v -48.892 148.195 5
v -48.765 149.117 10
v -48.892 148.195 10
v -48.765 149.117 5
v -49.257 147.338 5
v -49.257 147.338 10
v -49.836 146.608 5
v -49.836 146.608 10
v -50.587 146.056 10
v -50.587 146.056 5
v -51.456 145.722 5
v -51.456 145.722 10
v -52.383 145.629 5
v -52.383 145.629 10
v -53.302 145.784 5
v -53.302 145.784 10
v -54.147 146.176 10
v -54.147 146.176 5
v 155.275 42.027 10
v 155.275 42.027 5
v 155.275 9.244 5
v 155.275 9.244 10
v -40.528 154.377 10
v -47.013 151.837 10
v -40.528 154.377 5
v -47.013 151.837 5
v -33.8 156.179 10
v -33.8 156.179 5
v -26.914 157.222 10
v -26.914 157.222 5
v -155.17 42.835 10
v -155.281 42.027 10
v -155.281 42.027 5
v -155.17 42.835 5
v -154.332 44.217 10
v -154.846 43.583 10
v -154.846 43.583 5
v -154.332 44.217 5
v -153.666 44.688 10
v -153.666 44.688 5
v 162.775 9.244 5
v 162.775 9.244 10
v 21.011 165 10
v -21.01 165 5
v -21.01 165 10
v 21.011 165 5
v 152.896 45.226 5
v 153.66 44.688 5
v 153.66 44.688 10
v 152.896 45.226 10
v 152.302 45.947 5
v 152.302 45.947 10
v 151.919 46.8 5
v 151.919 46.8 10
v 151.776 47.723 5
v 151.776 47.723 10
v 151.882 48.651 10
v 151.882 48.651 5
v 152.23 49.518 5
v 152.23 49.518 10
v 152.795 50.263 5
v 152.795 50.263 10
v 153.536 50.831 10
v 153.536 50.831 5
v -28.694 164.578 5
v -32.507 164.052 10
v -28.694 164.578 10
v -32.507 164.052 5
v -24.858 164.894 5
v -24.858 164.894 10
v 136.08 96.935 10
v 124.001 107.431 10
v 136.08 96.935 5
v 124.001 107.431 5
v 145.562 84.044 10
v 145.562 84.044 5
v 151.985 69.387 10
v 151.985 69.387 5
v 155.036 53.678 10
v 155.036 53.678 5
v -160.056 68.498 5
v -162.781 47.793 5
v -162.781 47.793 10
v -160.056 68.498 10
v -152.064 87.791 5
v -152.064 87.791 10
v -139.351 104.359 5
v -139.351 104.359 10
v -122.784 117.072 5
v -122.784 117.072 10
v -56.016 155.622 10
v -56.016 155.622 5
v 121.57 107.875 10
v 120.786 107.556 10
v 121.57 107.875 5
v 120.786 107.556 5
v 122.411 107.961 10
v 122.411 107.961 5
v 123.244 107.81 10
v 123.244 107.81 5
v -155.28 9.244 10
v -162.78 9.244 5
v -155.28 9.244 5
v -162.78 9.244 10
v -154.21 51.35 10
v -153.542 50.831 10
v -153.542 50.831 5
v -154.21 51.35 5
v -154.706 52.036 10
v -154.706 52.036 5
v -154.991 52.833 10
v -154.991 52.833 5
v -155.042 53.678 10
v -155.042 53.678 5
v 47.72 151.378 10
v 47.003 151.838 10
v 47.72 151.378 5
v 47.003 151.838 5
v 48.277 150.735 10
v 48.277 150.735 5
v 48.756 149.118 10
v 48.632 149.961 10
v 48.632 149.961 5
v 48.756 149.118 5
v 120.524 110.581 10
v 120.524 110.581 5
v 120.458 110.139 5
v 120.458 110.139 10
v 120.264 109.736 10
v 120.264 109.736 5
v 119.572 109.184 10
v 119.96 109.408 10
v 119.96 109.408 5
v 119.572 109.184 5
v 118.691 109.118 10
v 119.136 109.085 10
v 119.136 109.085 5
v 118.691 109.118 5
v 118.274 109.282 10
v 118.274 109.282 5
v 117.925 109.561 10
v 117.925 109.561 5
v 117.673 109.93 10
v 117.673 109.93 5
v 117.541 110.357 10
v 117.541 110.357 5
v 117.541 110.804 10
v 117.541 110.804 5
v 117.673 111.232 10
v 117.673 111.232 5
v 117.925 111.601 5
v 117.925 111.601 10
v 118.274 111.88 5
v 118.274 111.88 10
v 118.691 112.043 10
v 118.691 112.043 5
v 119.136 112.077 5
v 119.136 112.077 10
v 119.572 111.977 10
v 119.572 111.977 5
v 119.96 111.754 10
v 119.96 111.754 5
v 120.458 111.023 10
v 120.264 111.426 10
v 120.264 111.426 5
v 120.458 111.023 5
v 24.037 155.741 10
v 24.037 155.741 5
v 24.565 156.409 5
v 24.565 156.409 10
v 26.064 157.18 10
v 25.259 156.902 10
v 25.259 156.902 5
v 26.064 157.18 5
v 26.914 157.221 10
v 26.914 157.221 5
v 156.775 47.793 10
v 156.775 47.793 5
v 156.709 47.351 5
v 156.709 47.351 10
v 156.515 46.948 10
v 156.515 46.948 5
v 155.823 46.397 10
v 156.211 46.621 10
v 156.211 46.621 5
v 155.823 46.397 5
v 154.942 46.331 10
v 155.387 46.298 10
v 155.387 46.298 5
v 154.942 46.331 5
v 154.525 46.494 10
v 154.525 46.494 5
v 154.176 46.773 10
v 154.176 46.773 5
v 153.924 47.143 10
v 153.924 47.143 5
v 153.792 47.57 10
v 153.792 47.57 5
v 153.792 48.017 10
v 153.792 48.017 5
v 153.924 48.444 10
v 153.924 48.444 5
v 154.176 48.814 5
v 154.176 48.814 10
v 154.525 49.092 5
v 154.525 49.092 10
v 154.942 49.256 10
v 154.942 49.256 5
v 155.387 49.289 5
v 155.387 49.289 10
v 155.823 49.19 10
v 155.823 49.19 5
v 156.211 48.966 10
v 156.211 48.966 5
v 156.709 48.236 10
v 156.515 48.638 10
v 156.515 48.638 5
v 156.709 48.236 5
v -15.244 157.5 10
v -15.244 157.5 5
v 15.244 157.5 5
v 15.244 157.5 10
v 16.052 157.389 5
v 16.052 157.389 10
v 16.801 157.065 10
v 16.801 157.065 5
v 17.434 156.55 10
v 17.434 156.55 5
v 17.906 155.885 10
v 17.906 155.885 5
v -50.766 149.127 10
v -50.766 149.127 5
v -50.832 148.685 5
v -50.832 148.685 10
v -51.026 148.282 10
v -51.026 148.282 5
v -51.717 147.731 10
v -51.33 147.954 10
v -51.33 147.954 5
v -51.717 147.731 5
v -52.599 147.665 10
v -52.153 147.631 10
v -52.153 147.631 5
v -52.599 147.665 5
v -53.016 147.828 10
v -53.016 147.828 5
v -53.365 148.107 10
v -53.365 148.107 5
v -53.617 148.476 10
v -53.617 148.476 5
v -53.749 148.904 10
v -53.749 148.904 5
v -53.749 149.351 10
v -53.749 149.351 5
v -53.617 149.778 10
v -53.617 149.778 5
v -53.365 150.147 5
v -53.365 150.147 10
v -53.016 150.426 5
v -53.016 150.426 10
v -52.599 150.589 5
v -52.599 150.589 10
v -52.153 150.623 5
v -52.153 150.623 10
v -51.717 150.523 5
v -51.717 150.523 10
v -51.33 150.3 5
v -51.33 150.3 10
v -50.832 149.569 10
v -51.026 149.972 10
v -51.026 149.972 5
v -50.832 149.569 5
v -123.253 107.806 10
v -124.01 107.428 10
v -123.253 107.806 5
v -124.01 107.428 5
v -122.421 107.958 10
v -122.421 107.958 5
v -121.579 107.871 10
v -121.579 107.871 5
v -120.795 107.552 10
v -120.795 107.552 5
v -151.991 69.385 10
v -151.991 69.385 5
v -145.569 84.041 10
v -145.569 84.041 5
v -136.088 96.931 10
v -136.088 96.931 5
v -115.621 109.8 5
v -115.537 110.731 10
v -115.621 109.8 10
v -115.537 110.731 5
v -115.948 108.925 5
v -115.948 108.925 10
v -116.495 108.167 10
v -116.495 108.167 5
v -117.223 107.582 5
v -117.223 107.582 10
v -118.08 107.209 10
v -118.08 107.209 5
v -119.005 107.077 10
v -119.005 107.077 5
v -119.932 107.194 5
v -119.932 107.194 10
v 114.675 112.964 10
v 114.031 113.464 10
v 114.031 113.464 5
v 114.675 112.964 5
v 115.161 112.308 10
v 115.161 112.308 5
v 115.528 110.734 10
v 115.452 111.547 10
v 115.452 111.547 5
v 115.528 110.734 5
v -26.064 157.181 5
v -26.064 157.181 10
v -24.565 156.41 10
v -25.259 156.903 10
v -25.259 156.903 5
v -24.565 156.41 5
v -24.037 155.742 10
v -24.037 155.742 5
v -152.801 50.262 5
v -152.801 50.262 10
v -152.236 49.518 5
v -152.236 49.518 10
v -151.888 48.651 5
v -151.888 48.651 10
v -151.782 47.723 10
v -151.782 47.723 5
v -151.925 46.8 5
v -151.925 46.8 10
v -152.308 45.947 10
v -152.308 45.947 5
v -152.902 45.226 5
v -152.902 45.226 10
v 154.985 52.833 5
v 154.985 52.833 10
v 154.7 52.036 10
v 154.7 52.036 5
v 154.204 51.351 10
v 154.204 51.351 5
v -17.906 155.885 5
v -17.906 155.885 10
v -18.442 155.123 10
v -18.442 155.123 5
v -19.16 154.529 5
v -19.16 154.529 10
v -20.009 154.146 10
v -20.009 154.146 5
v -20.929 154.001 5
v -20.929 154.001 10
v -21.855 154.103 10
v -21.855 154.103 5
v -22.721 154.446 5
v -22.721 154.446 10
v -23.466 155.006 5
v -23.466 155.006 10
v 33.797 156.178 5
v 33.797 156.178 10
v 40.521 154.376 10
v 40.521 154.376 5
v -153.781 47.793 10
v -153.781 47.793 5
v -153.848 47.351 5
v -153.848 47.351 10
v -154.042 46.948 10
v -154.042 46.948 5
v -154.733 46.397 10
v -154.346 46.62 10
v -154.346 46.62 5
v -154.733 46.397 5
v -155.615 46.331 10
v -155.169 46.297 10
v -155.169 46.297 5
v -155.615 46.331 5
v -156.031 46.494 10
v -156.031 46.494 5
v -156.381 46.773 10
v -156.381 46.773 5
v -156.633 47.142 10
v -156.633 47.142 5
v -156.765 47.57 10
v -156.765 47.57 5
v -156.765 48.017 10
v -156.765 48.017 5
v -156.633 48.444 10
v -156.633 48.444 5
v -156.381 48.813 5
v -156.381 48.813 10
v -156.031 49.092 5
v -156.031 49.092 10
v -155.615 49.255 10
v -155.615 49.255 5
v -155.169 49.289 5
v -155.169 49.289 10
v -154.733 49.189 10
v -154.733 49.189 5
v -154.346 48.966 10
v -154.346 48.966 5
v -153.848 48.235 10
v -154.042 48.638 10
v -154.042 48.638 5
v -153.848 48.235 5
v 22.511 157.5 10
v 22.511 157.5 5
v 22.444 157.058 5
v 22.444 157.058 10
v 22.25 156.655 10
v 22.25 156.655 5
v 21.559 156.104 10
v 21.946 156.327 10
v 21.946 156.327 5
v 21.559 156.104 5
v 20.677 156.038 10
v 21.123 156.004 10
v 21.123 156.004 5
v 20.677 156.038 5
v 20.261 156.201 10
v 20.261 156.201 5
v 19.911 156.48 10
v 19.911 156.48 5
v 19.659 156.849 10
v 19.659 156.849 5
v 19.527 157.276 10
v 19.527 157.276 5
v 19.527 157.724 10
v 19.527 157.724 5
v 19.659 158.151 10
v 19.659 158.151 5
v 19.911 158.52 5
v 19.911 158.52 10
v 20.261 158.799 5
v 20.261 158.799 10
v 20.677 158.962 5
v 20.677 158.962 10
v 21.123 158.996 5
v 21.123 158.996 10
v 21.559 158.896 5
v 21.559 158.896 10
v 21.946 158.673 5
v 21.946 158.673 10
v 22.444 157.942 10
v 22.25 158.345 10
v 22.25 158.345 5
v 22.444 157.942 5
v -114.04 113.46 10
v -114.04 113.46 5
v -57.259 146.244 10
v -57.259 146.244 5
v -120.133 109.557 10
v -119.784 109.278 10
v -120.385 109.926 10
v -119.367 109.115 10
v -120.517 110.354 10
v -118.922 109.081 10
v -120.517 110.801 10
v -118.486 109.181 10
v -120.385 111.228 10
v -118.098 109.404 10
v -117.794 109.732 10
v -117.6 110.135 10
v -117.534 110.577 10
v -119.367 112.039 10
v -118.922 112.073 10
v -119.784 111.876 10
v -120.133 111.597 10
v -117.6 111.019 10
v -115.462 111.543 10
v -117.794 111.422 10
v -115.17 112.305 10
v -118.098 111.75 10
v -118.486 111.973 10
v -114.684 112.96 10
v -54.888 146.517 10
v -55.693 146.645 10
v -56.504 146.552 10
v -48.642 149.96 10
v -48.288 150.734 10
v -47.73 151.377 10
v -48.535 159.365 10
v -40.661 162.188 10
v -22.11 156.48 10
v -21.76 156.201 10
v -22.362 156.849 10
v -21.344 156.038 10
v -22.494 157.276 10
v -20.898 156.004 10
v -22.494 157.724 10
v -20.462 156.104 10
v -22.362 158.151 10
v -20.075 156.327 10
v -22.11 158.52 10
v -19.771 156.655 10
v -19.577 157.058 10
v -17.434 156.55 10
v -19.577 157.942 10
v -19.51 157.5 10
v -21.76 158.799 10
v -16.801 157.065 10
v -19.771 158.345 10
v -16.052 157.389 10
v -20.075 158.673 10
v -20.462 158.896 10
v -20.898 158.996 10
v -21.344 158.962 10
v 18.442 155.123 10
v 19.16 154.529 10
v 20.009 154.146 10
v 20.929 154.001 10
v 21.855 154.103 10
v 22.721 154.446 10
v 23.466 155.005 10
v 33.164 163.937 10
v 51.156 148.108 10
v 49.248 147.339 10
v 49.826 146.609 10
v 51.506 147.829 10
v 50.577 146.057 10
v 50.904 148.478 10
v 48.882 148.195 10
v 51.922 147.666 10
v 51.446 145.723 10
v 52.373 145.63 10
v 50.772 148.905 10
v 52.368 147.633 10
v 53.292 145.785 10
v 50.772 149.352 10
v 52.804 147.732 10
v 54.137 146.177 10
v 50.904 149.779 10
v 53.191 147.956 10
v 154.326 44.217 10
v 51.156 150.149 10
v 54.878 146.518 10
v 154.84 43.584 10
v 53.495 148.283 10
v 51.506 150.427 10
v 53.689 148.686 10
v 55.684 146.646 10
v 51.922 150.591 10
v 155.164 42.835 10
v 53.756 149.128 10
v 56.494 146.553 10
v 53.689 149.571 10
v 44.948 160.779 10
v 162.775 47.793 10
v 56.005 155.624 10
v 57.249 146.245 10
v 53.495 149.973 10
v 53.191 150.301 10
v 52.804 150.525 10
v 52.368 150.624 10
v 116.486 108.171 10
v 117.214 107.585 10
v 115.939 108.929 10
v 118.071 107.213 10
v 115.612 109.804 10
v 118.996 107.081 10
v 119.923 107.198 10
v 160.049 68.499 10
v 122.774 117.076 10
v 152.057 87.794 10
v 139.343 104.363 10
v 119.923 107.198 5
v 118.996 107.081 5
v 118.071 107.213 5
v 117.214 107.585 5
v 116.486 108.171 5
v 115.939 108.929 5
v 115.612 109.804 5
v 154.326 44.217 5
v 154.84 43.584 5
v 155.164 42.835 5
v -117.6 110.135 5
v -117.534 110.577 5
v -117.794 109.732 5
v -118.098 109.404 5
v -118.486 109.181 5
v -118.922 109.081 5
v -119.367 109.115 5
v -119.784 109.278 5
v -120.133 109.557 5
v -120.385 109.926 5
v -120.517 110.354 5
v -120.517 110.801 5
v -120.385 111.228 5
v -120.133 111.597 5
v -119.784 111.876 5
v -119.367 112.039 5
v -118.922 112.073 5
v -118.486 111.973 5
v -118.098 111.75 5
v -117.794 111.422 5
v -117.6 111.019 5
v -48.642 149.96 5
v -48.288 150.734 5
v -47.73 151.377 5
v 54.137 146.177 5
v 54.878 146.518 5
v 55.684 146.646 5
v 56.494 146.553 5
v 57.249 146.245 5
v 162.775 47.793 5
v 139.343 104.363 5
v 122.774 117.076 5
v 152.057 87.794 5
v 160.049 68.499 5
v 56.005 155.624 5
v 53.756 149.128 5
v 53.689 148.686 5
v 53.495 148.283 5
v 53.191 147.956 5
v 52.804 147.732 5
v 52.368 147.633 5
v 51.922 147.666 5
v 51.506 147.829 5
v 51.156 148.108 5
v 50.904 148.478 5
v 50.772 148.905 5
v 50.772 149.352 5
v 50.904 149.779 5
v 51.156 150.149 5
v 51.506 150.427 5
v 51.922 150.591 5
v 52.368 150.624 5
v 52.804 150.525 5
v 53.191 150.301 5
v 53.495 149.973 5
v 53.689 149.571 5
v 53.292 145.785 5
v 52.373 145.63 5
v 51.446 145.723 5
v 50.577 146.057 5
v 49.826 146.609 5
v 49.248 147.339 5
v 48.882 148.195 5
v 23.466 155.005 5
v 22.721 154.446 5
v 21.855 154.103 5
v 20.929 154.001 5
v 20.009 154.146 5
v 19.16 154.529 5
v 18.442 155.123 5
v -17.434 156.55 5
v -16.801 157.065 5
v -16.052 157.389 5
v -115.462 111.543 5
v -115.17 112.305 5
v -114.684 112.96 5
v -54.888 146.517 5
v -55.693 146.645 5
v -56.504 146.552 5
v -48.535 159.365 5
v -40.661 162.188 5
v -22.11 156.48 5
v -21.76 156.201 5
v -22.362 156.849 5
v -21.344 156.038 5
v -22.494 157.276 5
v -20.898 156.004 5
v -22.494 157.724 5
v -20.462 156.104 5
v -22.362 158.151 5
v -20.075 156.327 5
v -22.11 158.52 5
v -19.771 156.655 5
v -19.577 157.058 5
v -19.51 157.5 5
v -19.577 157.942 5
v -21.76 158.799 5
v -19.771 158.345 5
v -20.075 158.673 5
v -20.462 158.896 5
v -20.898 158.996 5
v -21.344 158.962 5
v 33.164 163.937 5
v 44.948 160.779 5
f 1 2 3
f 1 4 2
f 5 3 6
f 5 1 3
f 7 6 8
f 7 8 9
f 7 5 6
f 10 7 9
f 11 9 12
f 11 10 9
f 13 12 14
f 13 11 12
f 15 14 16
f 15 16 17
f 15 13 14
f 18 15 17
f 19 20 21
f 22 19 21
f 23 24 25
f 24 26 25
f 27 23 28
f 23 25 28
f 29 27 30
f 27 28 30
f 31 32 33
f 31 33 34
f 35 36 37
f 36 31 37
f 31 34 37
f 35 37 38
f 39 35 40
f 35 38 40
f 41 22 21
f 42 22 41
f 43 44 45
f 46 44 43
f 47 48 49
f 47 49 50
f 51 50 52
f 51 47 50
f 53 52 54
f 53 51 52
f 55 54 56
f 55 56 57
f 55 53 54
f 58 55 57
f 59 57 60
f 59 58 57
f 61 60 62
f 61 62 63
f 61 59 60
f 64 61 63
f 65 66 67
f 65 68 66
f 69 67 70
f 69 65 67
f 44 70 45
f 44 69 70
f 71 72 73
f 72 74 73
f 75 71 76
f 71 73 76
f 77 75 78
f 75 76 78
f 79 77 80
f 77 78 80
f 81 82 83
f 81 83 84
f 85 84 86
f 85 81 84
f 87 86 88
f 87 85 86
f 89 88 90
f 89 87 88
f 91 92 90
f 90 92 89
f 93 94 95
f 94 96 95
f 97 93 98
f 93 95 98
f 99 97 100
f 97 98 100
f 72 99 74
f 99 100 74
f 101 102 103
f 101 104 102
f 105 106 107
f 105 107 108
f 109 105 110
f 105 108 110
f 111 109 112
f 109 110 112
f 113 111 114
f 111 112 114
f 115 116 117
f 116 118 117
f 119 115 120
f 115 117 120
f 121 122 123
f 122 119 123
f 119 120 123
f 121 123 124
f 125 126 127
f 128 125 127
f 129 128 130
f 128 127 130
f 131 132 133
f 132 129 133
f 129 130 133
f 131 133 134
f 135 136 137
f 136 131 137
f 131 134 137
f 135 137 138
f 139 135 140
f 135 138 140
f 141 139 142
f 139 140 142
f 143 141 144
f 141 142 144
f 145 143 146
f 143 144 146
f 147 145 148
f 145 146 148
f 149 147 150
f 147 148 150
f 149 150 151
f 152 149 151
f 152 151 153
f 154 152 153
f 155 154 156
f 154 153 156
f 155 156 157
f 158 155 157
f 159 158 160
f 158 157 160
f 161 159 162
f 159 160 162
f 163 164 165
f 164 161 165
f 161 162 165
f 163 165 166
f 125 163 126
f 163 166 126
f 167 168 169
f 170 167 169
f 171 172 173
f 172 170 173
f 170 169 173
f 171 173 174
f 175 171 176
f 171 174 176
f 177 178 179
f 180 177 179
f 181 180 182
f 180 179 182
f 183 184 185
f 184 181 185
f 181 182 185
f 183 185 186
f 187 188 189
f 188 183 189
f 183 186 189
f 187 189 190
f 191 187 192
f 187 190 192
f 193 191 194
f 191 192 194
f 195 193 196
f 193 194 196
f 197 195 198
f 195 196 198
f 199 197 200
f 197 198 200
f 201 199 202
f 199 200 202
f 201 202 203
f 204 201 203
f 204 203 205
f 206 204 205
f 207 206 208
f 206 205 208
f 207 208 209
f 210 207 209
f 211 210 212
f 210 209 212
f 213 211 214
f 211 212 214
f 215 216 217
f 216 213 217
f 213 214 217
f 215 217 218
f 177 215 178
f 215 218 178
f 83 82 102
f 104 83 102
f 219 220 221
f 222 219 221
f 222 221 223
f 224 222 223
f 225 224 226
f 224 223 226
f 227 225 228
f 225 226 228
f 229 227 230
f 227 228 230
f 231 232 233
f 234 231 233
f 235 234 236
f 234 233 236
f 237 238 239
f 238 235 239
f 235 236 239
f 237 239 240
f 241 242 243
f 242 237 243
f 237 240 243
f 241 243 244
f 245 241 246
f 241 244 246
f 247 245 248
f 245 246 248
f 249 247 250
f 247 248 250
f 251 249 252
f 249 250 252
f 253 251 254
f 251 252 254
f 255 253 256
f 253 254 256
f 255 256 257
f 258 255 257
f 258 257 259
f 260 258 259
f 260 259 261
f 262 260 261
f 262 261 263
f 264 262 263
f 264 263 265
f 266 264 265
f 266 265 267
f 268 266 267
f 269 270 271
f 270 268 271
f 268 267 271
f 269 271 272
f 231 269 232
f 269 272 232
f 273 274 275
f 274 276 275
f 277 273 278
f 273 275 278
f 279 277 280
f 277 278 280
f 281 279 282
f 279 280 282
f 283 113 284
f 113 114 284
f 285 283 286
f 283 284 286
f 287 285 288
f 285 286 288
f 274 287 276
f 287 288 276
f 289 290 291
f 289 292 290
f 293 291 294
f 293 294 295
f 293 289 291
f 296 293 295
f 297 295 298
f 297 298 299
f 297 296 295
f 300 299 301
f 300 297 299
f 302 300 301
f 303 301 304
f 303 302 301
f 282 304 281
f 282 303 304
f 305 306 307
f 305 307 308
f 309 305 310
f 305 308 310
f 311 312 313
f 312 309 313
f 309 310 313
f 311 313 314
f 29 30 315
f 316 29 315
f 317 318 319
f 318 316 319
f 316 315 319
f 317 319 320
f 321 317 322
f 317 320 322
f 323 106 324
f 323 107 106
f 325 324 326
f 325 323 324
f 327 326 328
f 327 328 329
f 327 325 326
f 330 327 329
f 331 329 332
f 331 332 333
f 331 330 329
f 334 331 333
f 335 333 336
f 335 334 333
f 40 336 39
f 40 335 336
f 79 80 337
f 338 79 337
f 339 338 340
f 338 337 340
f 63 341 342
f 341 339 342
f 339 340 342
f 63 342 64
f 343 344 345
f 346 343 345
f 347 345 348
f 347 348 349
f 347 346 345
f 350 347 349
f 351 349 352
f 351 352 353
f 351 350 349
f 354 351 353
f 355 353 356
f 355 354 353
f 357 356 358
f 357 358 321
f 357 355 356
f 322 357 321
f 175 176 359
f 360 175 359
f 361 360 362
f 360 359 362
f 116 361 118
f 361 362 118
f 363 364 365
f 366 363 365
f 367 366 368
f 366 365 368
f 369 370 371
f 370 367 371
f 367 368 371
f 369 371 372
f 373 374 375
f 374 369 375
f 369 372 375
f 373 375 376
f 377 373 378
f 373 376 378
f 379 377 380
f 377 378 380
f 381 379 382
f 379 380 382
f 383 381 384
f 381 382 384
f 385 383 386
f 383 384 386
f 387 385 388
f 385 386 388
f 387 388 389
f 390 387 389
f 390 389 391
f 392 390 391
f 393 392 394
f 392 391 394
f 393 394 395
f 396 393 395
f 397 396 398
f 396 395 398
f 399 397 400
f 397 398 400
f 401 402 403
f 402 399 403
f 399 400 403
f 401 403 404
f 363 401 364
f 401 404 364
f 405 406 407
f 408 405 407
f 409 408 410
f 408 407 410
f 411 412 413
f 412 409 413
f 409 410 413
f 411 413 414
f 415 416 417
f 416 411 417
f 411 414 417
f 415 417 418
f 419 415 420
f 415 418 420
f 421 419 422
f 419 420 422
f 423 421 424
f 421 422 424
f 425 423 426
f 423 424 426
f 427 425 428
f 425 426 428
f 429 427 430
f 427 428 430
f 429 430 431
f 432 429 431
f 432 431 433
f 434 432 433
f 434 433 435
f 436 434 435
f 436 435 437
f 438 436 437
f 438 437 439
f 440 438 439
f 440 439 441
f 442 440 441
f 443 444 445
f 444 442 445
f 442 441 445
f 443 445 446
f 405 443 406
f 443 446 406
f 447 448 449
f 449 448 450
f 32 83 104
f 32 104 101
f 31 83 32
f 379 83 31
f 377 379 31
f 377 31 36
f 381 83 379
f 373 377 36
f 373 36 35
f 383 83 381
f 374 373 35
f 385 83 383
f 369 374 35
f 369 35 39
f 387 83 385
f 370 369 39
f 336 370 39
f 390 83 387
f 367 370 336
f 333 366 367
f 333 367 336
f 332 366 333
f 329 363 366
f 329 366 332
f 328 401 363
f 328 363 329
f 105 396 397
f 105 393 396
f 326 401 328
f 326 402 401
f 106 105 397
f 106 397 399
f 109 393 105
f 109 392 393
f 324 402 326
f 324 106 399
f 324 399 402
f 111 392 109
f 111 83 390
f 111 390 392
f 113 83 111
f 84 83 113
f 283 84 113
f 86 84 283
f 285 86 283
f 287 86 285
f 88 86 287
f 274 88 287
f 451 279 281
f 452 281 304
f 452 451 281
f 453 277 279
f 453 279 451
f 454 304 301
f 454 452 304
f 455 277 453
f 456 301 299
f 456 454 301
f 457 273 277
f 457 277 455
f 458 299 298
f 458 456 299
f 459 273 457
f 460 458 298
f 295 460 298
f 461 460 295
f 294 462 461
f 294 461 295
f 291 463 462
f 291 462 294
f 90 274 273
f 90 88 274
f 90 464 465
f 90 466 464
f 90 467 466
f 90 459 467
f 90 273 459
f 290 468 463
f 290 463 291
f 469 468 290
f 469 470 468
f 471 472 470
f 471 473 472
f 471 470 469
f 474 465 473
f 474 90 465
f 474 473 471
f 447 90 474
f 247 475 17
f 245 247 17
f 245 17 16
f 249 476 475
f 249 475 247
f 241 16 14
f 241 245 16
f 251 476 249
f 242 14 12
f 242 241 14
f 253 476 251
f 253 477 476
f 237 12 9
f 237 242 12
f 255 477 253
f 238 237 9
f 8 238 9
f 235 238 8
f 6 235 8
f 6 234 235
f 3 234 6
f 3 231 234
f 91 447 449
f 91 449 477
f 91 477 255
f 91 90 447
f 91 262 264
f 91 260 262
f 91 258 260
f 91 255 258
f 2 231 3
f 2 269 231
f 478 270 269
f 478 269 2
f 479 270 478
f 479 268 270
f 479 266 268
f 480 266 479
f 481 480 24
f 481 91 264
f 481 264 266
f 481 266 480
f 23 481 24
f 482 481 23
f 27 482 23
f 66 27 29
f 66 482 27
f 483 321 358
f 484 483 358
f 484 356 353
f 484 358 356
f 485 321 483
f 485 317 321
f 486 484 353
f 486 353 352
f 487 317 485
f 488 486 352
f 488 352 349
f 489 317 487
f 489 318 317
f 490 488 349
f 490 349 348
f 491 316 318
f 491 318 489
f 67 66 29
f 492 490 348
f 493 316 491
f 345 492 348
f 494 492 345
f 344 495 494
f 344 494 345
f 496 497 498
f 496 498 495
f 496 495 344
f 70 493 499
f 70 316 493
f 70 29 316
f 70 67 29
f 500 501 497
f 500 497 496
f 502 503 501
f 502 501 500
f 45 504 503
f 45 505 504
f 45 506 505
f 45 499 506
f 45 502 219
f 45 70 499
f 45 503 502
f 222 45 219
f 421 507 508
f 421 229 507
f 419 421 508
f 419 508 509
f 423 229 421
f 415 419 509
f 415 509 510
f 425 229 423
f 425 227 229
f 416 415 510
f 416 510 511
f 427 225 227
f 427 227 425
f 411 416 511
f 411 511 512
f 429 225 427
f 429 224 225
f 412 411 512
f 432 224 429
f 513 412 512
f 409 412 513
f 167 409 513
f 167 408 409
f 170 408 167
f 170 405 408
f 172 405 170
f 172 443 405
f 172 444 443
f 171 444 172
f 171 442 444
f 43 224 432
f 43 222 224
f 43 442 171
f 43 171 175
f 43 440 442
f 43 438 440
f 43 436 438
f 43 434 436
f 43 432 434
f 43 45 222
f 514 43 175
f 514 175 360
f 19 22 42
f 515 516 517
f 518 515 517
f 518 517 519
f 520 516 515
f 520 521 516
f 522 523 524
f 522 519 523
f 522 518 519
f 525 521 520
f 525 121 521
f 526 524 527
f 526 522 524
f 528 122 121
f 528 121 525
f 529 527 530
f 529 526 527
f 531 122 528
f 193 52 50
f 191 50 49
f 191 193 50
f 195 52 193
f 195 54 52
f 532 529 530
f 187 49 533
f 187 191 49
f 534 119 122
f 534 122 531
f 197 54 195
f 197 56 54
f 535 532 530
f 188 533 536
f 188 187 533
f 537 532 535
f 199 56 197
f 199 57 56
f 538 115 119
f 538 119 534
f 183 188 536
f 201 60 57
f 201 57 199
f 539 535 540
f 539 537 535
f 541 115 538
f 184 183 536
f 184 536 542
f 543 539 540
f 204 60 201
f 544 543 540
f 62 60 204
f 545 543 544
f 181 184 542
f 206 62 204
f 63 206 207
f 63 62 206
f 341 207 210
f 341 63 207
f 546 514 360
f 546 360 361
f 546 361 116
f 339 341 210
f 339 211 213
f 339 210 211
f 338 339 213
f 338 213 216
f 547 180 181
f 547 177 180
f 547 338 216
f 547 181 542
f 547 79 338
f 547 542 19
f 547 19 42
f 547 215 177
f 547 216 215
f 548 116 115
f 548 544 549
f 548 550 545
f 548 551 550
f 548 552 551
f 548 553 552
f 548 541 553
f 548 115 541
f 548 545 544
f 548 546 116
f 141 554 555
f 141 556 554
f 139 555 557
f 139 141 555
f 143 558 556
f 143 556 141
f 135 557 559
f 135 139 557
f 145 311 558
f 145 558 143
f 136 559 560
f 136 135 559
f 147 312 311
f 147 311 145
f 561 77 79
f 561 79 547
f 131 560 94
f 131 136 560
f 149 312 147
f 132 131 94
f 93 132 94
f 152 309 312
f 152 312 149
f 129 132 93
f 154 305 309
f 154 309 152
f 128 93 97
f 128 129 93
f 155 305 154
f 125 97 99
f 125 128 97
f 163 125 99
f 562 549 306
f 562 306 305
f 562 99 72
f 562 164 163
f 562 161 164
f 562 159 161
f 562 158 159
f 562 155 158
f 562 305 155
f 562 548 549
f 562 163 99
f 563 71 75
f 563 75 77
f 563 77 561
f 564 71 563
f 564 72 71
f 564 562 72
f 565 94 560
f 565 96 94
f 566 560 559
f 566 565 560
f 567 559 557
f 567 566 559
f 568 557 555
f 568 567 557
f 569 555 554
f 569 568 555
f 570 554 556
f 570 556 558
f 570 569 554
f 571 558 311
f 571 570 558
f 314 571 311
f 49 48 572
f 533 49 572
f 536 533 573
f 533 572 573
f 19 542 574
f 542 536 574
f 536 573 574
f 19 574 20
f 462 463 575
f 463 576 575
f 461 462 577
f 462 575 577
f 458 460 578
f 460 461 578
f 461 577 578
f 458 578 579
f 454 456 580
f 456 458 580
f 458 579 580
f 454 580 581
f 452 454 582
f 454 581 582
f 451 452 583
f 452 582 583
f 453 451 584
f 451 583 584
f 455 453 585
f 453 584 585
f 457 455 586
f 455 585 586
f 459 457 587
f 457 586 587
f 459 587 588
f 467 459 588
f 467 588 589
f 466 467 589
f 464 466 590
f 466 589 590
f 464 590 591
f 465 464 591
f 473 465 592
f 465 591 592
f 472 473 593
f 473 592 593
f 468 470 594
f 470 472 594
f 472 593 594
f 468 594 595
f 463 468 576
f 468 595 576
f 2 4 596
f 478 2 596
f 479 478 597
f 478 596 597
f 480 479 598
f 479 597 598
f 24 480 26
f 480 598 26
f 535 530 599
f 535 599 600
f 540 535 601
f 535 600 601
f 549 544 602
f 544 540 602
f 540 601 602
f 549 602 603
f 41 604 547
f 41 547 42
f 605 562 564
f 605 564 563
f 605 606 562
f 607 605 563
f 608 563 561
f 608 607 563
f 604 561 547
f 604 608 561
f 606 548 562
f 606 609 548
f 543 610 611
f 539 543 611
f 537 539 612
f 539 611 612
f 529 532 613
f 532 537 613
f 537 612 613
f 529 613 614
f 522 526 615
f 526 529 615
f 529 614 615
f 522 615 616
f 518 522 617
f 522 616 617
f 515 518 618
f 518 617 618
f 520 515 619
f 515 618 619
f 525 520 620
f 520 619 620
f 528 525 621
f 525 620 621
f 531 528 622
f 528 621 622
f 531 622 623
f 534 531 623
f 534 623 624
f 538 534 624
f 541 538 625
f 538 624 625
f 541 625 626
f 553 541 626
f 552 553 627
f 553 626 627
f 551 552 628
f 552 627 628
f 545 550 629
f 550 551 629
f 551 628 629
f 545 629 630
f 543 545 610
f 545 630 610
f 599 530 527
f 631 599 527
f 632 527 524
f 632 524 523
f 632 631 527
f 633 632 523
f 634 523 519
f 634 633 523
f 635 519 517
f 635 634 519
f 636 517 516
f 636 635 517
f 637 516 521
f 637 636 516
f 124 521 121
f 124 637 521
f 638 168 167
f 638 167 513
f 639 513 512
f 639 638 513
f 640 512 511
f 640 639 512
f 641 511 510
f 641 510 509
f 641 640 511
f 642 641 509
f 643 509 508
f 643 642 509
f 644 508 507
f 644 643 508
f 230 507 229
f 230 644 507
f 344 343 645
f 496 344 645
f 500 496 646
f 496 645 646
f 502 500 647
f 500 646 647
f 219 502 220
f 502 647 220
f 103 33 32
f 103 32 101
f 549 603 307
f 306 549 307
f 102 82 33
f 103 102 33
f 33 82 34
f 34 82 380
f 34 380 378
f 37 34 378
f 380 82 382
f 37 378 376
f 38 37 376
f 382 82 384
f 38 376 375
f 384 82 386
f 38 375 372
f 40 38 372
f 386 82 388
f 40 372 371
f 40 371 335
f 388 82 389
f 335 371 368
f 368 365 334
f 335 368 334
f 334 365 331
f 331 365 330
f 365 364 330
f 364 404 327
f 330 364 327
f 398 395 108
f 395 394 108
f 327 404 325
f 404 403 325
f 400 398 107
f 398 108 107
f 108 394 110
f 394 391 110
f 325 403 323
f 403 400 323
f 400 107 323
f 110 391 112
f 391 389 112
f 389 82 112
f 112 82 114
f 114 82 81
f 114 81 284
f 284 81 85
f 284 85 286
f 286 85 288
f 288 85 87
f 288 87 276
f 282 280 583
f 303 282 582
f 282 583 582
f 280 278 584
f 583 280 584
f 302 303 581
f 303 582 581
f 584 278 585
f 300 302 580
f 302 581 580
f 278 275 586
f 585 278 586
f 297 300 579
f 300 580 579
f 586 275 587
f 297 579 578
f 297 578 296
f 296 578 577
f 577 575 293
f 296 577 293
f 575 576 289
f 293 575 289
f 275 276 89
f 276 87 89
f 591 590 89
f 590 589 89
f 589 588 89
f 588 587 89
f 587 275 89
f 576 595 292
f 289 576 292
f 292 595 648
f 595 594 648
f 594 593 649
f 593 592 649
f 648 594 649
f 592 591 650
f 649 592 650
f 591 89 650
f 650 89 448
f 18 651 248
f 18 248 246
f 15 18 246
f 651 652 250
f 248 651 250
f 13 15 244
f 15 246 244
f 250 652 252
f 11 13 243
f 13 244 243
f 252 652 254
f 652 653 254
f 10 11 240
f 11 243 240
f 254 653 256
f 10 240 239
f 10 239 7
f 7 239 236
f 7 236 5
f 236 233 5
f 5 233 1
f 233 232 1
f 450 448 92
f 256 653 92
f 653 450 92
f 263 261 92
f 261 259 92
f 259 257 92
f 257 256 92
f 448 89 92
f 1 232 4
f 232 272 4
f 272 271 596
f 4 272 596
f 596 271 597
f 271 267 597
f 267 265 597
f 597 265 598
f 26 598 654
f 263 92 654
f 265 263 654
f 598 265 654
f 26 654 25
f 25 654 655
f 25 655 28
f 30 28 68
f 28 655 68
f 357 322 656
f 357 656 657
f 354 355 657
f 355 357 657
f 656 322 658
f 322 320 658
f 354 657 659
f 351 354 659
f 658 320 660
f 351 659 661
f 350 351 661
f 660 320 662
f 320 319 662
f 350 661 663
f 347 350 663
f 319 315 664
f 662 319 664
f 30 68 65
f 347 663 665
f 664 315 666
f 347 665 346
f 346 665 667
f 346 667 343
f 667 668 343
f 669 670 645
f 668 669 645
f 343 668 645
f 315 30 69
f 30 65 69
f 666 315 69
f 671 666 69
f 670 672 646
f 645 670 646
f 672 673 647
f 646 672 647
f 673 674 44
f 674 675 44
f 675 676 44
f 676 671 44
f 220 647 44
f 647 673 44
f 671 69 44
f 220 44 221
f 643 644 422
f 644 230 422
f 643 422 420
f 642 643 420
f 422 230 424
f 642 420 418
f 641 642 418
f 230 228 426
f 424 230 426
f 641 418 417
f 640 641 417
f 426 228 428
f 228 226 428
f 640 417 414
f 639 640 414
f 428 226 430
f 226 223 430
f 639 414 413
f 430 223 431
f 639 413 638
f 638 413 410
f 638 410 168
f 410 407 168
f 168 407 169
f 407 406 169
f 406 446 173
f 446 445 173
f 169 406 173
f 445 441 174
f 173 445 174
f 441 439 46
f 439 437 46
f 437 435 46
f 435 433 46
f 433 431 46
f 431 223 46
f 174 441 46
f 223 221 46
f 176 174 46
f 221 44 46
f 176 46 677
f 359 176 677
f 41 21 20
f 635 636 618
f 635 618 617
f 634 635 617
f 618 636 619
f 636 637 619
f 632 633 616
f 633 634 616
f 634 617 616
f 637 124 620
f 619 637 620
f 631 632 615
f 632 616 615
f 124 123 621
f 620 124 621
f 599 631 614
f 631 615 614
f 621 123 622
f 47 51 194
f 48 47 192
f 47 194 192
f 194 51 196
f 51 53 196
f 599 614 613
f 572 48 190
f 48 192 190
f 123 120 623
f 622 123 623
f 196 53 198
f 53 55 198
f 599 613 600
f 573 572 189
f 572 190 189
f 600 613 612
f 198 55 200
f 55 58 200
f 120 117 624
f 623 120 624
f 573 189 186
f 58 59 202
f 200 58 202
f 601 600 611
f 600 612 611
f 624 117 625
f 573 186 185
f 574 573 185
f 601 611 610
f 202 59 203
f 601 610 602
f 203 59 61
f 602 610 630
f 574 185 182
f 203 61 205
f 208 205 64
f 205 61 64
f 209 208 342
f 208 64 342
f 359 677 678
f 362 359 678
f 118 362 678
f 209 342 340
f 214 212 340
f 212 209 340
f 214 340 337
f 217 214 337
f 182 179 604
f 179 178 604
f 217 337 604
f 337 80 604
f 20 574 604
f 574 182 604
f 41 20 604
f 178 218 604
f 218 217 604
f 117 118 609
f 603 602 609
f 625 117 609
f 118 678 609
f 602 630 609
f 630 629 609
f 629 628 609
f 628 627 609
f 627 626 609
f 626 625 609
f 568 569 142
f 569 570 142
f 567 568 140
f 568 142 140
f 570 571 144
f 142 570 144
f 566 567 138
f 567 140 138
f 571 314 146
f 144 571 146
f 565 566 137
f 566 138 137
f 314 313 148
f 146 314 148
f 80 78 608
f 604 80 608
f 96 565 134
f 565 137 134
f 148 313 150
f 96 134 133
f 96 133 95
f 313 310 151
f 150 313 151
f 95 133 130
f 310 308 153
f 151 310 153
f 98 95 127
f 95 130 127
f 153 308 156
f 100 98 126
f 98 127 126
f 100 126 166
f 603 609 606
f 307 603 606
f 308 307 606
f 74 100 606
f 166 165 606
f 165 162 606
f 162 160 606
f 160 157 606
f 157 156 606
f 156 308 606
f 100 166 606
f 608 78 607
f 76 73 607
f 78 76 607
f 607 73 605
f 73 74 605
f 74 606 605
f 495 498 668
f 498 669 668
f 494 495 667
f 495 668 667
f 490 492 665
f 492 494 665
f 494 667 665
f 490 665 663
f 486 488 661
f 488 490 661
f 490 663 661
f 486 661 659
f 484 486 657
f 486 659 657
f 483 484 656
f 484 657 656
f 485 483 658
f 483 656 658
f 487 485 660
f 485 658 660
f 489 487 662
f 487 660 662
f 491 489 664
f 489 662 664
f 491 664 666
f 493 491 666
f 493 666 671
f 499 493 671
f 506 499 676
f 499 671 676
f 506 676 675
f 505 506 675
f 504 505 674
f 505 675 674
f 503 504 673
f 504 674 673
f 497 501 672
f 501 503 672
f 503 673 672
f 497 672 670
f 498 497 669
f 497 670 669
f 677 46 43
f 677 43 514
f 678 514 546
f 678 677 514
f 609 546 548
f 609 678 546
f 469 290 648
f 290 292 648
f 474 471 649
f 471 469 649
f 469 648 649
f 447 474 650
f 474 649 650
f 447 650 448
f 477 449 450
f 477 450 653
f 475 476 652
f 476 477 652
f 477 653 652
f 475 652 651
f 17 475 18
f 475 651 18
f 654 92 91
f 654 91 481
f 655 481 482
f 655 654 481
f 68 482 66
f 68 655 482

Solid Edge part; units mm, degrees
sketch "Sketch1" plane through (0.0007, 14.651, 5) normal (0, 0, 1) x (1, 0, 0)
  line L0 (-114.0407, 98.8093) -> (-57.2599, 131.5929)
  arc A0 (-54.1474, 131.5247) -> (-57.2599, 131.5929) centre (-55.7598, 128.9948) ccw
  arc A1 (-47.0142, 137.1861) -> (-48.7662, 134.4664) centre (-45.7662, 134.458) ccw
  arc A2 (-47.0142, 137.1861) -> (-26.9146, 142.5706) centre (-21.0226, 80.3698) cw
  arc A3 (-24.0376, 141.0909) -> (-26.9146, 142.5706) centre (-26.6317, 139.5839) ccw
  arc A4 (-15.245, 142.849) -> (-17.9063, 141.2336) centre (-15.245, 139.849) ccw
  line L1 (-15.245, 142.849) -> (15.2436, 142.849)
  arc A5 (17.905, 141.2336) -> (15.2436, 142.849) centre (15.2436, 139.849) ccw
  arc A6 (26.9132, 142.5696) -> (24.036, 141.0904) centre (26.6298, 139.583) ccw
  arc A7 (26.9132, 142.5696) -> (47.0027, 137.1869) centre (21.0099, 80.3561) cw
  arc A8 (48.7549, 134.4673) -> (47.0027, 137.1869) centre (45.7549, 134.4587) ccw
  arc A9 (57.2487, 131.5943) -> (54.1362, 131.526) centre (55.7487, 128.9962) ccw
  line L2 (57.2487, 131.5943) -> (114.0299, 98.8129)
  arc A10 (115.5271, 96.0833) -> (114.0299, 98.8129) centre (112.5299, 96.2148) ccw
  arc A11 (124.0003, 92.7805) -> (120.7849, 92.9052) centre (122.2944, 90.3127) ccw
  arc A12 (124.0003, 92.7805) -> (155.0355, 39.027) centre (82.7747, 33.1424) cw
  arc A13 (153.5358, 36.1799) -> (155.0355, 39.027) centre (152.0454, 38.7835) ccw
  arc A14 (155.2747, 27.3761) -> (153.6593, 30.0375) centre (152.2747, 27.3761) ccw
  line L3 (155.2747, 27.3761) -> (155.2747, -38.192)
  arc A15 (153.6593, -40.8534) -> (155.2747, -38.192) centre (152.2747, -38.192) ccw
  arc A16 (154.9954, -49.8615) -> (153.5161, -46.9844) centre (152.0088, -49.5782) ccw
  arc A17 (154.9954, -49.8615) -> (149.6134, -69.9554) centre (92.7533, -43.9583) cw
  arc A18 (146.8942, -71.7079) -> (149.6134, -69.9554) centre (146.8851, -68.7079) ccw
  arc A19 (144.0217, -80.2016) -> (143.9534, -77.0892) centre (141.4236, -78.7016) ccw
  line L4 (144.0217, -80.2016) -> (127.6444, -108.5679)
  arc A20 (122.7007, -116.5716) -> (122.8583, -113.3403) centre (120.256, -114.8329) ccw
  arc A21 (77.6703, -142.5696) -> (122.7007, -116.5716) centre (71.767, -80.3476) ccw
  arc A22 (74.7931, -141.0904) -> (77.6703, -142.5696) centre (77.3869, -139.583) ccw
  arc A23 (66.0007, -142.849) -> (68.6621, -141.2336) centre (66.0007, -139.849) ccw
  line L5 (5.7656, -142.849) -> (66.0007, -142.849)
  arc A24 (3.1042, -141.2336) -> (5.7656, -142.849) centre (5.7656, -139.849) ccw
  arc A25 (-5.767, -142.849) -> (-3.1056, -141.2336) centre (-5.767, -139.849) ccw
  line L6 (-66.0021, -142.849) -> (-5.767, -142.849)
  arc A26 (-68.6634, -141.2336) -> (-66.0021, -142.849) centre (-66.0021, -139.849) ccw
  arc A27 (-77.6716, -142.5694) -> (-74.7944, -141.0903) centre (-77.3881, -139.5828) ccw
  arc A28 (-122.6994, -116.5717) -> (-77.6716, -142.5694) centre (-71.7665, -80.349) ccw
  arc A29 (-122.857, -113.3404) -> (-122.6994, -116.5717) centre (-120.2547, -114.833) ccw
  arc A30 (-128.7762, -106.6053) -> (-126.0465, -108.1024) centre (-126.1781, -105.1053) ccw
  line L7 (-144.0218, -80.199) -> (-128.7762, -106.6053)
  arc A31 (-143.9535, -77.0865) -> (-144.0218, -80.199) centre (-141.4237, -78.699) ccw
  arc A32 (-149.6144, -69.9531) -> (-146.8949, -71.7053) centre (-146.8862, -68.7053) ccw
  arc A33 (-154.9987, -49.8585) -> (-149.6144, -69.9531) centre (-92.7672, -43.9523) ccw
  arc A34 (-153.5196, -46.9813) -> (-154.9987, -49.8585) centre (-152.0122, -49.5751) ccw
  arc A35 (-155.2786, -38.189) -> (-153.6631, -40.8503) centre (-152.2786, -38.1889) ccw
  line L8 (-155.2818, 27.3758) -> (-155.2786, -38.189)
  arc A36 (-153.6665, 30.0373) -> (-155.2818, 27.3758) centre (-152.2818, 27.376) ccw
  arc A37 (-155.0428, 39.0267) -> (-153.5432, 36.1796) centre (-152.0527, 38.7832) ccw
  arc A38 (-124.0109, 92.7765) -> (-155.0428, 39.0267) centre (-82.7847, 33.1421) ccw
  arc A39 (-120.7955, 92.9014) -> (-124.0109, 92.7765) centre (-122.3049, 90.3088) ccw
  arc A40 (-114.0407, 98.8093) -> (-115.5378, 96.0796) centre (-112.5406, 96.2112) ccw
  arc A41 (-48.7662, 134.4664) -> (-54.1474, 131.5247) centre (-52.2662, 134.4761) cw
  arc A42 (-17.9064, 141.2336) -> (-24.0377, 141.0909) centre (-21.0113, 142.849) cw
  arc A43 (24.036, 141.0904) -> (17.905, 141.2336) centre (21.0099, 142.849) cw
  arc A44 (54.1362, 131.526) -> (48.7549, 134.4673) centre (52.2549, 134.4774) cw
  arc A45 (120.7849, 92.9052) -> (115.5271, 96.0832) centre (119.0237, 95.9298) cw
  arc A46 (153.6593, 30.0375) -> (153.5358, 36.1799) centre (155.2747, 33.1424) cw
  arc A47 (153.5161, -46.9844) -> (153.6593, -40.8534) centre (155.2747, -43.9583) cw
  arc A48 (143.9534, -77.0891) -> (146.8942, -71.7079) centre (146.9048, -75.2079) cw
  arc A49 (122.8584, -113.3404) -> (127.6444, -108.5679) centre (125.8944, -111.599) cw
  arc A50 (68.6621, -141.2336) -> (74.7931, -141.0904) centre (71.767, -142.849) cw
  arc A51 (-3.1056, -141.2336) -> (3.1042, -141.2336) centre (-0.0007, -142.849) cw
  arc A52 (-74.7944, -141.0903) -> (-68.6635, -141.2336) centre (-71.7684, -142.849) cw
  arc A53 (-126.0466, -108.1024) -> (-122.857, -113.3404) centre (-125.8931, -111.599) cw
  arc A54 (-146.8949, -71.7053) -> (-143.9536, -77.0866) centre (-146.905, -75.2053) cw
  arc A55 (-153.6632, -40.8503) -> (-153.5196, -46.9813) centre (-155.2784, -43.9553) cw
  arc A56 (-153.5432, 36.1796) -> (-153.6665, 30.0373) centre (-155.2821, 33.1421) cw
  arc A57 (-115.5377, 96.0796) -> (-120.7955, 92.9014) centre (-119.0344, 95.926) cw
  line L9 (-56.0166, 140.971) -> (-122.7845, 102.4212)
  arc A58 (-162.7821, 33.1421) -> (-122.7845, 102.4212) centre (-82.7847, 33.1421) cw
  line L10 (-162.7821, 33.1421) -> (-162.7784, -43.9553)
  arc A59 (-162.7784, -43.9553) -> (-153.4002, -78.9553) centre (-92.7784, -43.9553) ccw
  line L11 (-132.3882, -115.349) -> (-153.4002, -78.9553)
  arc A60 (-132.3882, -115.349) -> (-71.7683, -150.349) centre (-71.7665, -80.349) ccw
  line L12 (71.767, -150.349) -> (-71.7683, -150.349)
  arc A61 (71.767, -150.349) -> (132.3896, -115.349) centre (71.7678, -80.349) ccw
  line L13 (132.3896, -115.349) -> (153.4002, -78.9576)
  arc A62 (162.7747, -43.9583) -> (153.4002, -78.9576) centre (92.791, -43.9684) cw
  line L14 (162.7747, 33.1424) -> (162.7747, -43.9583)
  arc A63 (122.7736, 102.4251) -> (162.7747, 33.1424) centre (82.7747, 33.1424) cw
  line L15 (56.0045, 140.9728) -> (122.7736, 102.4251)
  arc A64 (21.0099, 150.349) -> (56.0045, 140.9728) centre (21.008, 80.349) cw
  line L16 (-21.0112, 150.349) -> (21.0099, 150.349)
  arc A65 (-32.5074, 149.4015) -> (-21.0112, 150.349) centre (-20.997, 79.961) cw
  arc A66 (-44.641, 146.2432) -> (-32.5074, 149.4015) centre (-21.0122, 80.3518) cw
  arc A67 (-56.0166, 140.971) -> (-44.641, 146.2432) centre (-21.0122, 80.3518) cw
  circle A68 centre (-71.7683, -142.849) radius 1.5
  circle A69 centre (-0.0007, -142.849) radius 1.5
  circle A70 centre (-125.893, -111.599) radius 1.5
  circle A71 centre (-146.905, -75.2053) radius 1.5
  circle A72 centre (-155.2784, -43.9553) radius 1.5
  circle A73 centre (-155.2821, 33.1421) radius 1.5
  circle A74 centre (-119.0344, 95.9261) radius 1.5
  circle A75 centre (-52.2662, 134.4761) radius 1.5
  circle A76 centre (-21.0112, 142.849) radius 1.5
  circle A77 centre (21.0099, 142.849) radius 1.5
  circle A78 centre (52.2549, 134.4774) radius 1.5
  circle A79 centre (119.0237, 95.9298) radius 1.5
  circle A80 centre (155.2747, 33.1424) radius 1.5
  circle A81 centre (155.2747, -43.9583) radius 1.5
  circle A82 centre (146.9048, -75.2079) radius 1.5
  circle A83 centre (125.8944, -111.599) radius 1.5
  circle A84 centre (71.767, -142.849) radius 1.5
extrude "ExtrudedProtrusion_7" add sketch "Sketch1" along normal blind 5
sketch "Sketch2" plane through (-0.003, 14.651, 10) normal (0, 0, 1) x (1, 0, 0)
  line L0 (-170.0115, -5.4066) -> (169.0999, -5.4066)
  line L1 (169.0999, -5.4066) -> (169.0999, -159.984)
  line L2 (169.0999, -159.984) -> (-170.0115, -159.984)
  line L3 (-170.0115, -159.984) -> (-170.0115, -5.4066)
extrude "Cutout1" cut sketch "Sketch2" against normal up to next
properties material "Polycarbonate"
